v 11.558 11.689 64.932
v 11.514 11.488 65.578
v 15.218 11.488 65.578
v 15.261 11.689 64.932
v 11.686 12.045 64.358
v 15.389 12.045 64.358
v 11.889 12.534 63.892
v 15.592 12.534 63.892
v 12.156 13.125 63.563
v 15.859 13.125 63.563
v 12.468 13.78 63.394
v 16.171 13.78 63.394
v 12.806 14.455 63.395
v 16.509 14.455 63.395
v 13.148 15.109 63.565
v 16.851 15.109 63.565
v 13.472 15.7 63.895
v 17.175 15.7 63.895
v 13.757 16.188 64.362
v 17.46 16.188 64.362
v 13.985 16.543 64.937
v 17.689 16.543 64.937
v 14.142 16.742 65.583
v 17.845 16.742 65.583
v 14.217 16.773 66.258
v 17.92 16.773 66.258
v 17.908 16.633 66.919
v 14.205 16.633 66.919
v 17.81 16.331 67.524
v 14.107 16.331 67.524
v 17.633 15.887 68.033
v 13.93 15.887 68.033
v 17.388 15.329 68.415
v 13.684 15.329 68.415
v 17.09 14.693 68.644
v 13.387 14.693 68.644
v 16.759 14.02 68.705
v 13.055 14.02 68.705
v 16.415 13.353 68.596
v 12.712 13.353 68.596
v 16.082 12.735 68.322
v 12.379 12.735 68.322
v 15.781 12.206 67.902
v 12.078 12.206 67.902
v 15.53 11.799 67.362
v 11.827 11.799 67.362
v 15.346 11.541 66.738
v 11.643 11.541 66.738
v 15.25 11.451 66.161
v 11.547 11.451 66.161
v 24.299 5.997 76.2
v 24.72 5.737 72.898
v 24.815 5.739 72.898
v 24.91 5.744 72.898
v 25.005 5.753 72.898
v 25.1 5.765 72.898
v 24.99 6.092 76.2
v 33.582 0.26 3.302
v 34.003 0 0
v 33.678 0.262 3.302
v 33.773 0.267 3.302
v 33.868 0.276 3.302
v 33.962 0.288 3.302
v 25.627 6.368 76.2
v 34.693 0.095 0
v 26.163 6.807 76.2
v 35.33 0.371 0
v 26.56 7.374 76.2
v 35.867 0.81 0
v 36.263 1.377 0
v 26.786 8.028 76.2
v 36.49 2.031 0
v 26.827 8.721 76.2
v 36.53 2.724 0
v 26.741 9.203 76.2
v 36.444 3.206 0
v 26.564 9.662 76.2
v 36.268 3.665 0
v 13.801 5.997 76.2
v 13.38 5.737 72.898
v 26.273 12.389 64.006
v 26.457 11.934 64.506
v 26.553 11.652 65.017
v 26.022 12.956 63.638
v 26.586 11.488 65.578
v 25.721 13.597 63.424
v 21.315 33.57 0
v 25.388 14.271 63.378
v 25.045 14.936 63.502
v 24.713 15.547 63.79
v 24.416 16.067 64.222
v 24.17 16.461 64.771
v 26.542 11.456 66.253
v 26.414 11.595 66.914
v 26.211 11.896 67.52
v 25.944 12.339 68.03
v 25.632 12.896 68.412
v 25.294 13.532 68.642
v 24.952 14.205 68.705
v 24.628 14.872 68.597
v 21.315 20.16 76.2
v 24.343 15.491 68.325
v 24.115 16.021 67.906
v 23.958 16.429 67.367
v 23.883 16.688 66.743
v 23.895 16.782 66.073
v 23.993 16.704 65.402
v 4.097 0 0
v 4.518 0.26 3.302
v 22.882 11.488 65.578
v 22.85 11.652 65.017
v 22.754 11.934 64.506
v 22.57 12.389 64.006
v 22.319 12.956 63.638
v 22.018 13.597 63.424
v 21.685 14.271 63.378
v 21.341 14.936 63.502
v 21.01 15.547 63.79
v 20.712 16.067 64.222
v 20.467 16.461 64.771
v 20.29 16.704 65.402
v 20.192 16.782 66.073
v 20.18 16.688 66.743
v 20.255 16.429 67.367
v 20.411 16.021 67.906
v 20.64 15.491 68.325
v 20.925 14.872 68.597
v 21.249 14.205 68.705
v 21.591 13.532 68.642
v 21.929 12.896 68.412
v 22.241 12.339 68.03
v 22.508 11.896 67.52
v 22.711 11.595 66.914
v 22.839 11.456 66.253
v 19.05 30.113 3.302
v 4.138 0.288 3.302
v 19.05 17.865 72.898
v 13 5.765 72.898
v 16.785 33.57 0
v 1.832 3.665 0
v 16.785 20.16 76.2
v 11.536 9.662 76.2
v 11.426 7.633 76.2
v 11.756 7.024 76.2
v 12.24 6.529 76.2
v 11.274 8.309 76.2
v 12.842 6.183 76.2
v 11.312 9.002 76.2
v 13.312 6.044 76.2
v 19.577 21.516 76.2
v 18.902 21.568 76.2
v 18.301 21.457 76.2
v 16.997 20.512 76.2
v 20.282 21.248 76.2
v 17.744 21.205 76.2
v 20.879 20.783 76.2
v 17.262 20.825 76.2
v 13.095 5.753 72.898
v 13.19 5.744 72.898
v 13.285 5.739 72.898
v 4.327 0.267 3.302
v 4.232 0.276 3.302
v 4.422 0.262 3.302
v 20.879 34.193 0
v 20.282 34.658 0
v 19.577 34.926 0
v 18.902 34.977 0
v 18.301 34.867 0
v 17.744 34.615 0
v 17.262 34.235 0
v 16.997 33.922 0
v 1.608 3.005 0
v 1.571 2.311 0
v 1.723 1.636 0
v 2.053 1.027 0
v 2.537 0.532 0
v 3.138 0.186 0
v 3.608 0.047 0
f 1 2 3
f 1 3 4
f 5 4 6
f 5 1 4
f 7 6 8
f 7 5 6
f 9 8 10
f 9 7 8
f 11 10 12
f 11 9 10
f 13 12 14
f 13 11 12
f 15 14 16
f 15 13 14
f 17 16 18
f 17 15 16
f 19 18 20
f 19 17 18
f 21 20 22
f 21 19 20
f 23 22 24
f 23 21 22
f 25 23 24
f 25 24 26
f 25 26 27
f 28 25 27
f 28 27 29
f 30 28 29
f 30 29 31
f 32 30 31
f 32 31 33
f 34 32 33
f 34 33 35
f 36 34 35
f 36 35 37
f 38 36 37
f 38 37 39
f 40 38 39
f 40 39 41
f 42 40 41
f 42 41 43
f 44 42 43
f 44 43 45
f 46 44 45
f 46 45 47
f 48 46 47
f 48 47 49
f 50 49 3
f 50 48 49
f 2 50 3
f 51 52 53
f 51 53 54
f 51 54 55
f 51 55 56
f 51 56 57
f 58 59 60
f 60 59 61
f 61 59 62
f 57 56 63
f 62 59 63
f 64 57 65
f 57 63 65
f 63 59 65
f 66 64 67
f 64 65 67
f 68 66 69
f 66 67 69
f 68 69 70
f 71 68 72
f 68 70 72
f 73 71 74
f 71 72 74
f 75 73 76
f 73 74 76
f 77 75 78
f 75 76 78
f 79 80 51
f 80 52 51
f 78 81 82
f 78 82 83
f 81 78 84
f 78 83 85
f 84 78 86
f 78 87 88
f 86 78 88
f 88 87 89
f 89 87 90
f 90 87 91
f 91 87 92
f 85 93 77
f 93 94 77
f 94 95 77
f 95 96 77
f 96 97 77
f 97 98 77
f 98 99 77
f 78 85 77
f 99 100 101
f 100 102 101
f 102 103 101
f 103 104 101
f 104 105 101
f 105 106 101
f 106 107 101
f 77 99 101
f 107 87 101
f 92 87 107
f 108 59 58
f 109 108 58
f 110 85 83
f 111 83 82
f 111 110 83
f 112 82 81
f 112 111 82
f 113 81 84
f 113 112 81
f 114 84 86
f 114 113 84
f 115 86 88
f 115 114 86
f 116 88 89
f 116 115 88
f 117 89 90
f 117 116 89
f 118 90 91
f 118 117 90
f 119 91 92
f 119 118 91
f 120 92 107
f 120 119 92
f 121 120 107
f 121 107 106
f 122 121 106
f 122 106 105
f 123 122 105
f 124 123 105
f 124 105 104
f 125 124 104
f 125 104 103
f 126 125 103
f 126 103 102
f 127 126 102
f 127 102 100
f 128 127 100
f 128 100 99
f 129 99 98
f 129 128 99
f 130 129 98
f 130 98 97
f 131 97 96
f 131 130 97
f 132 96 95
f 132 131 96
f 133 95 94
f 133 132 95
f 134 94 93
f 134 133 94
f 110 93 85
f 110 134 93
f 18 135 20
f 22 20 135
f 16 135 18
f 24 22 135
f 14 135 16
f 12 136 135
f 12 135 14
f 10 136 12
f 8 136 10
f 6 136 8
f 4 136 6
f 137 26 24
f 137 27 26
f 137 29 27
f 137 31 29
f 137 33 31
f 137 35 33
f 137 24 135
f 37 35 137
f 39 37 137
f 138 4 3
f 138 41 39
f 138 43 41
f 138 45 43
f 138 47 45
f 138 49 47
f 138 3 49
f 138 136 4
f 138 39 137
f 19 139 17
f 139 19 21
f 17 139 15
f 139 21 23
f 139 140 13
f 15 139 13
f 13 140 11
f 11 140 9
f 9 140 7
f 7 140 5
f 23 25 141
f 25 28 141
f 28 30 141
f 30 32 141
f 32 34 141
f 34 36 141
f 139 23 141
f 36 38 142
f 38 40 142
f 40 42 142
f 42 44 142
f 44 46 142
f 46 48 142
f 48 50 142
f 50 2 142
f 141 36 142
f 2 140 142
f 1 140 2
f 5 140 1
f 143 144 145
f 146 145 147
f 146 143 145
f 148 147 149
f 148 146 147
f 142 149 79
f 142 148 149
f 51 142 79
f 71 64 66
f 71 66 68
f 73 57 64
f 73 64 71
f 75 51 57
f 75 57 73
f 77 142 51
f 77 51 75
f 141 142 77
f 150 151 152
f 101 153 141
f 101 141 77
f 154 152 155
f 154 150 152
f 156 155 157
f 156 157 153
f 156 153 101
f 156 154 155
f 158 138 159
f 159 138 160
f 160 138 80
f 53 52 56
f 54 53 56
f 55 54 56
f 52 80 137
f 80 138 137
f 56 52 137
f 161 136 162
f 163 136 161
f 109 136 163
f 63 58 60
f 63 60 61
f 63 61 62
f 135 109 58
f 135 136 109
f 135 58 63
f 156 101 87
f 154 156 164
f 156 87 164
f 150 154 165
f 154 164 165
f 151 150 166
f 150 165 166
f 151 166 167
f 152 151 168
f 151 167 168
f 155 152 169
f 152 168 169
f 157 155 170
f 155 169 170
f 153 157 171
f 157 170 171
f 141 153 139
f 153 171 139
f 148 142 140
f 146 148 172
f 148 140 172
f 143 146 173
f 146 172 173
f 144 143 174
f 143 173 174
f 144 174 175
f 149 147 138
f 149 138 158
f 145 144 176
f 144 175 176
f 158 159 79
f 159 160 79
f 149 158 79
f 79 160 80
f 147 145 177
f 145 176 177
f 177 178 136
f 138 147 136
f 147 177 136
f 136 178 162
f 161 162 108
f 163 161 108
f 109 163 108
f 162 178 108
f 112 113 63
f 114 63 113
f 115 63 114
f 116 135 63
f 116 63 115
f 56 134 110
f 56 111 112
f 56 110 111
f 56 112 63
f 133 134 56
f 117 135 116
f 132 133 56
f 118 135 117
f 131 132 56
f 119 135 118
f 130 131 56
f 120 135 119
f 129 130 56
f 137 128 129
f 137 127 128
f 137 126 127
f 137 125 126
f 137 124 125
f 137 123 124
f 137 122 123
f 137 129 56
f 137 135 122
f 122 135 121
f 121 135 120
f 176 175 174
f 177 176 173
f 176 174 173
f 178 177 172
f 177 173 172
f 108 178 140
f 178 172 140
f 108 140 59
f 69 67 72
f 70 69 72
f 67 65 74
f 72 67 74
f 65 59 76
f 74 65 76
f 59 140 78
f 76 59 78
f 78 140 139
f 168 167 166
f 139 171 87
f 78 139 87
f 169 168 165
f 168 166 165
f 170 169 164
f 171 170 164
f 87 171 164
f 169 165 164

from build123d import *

# Parameters (mm, degrees)
BOSS_EXTRUDE1_DEPTH = 76.2
BOSS_EXTRUDE1_TAPER = 4.5
SHELL1_T            = -3.302
SKETCH3_R           = 2.667
CUT_EXTRUDE1_DEPTH  = 94.3255592
FILLET1_R           = 2.54


with BuildPart() as part:
    # Sketch1 → Boss-Extrude1 (new body)
    with BuildSketch(Plane.XY):
        Polygon((19.05, 38.1), (0, 0), (38.1, 0), align=None)
    extrude(amount=BOSS_EXTRUDE1_DEPTH, taper=BOSS_EXTRUDE1_TAPER)

    # Shell1
    shell1_openings = [part.faces().sort_by_distance(p)[0] for p in [
        (19.05, 2.656988988, 33.76024606),
    ]]
    offset(amount=SHELL1_T, openings=shell1_openings, kind=Kind.INTERSECTION)

    # Sketch3 → Cut-Extrude1 (cut, through all)
    with BuildSketch(Plane(origin=(0, 0, 0), x_dir=(0, 0, -1), z_dir=(1, 0, 0))):
        with Locations(Location((-66.04, 14.114950363, 0), (0, 0, 279.98084931))):
            Circle(SKETCH3_R)
    extrude(amount=CUT_EXTRUDE1_DEPTH, mode=Mode.SUBTRACT)

    # Fillet1
    # the kernel refuses this fillet: 2.54 mm, written as the material it takes off along each edge
    with BuildSketch(Plane(origin=(39.379699759, -0.790897947, -10.049311237), x_dir=(-0.9920380235210648, -0.00988103768125179, -0.12555048778384248), z_dir=(-0.12593871481168567, 0.07783440625310155, 0.9889799013705022)), Plane(origin=(-1.279699759, -0.790897947, -10.049311237), x_dir=(0.43481502259412097, 0.8917247171317577, -0.1255504877838424), z_dir=(0.1259387148116856, 0.07783440625310152, 0.9889799013705022))) as fillet1_piece_1:
        with BuildLine():
            CenterArc((FILLET1_R * 1.60020309461, -FILLET1_R), FILLET1_R, 90, 115.995770326)
            Line((FILLET1_R * 0.701376689441, -FILLET1_R * 1.43830479506), (0, 0))
            Line((0, 0), (FILLET1_R * 1.60020309461, 0))
        make_face()
    extrude(amount=97.371667857, mode=Mode.SUBTRACT)
    with BuildSketch(Plane(origin=(19.05, 40.267836366, -12.318486277), x_dir=(-0.45268605430468506, -0.8781752040708111, -0.1545433505306691), z_dir=(0, -0.1733190032733758, 0.9848657386183782))) as fillet1_piece_2:
        with BuildLine():
            CenterArc((FILLET1_R * 1.96973147724, FILLET1_R), FILLET1_R, 143.832298895, 126.167701105)
            Line((FILLET1_R * 1.16243835589, FILLET1_R * 1.59015067248), (0, 0))
            Line((0, 0), (FILLET1_R * 1.96973147724, 0))
        make_face()
    extrude(amount=102.386529419, mode=Mode.SUBTRACT)


solid = part.part
